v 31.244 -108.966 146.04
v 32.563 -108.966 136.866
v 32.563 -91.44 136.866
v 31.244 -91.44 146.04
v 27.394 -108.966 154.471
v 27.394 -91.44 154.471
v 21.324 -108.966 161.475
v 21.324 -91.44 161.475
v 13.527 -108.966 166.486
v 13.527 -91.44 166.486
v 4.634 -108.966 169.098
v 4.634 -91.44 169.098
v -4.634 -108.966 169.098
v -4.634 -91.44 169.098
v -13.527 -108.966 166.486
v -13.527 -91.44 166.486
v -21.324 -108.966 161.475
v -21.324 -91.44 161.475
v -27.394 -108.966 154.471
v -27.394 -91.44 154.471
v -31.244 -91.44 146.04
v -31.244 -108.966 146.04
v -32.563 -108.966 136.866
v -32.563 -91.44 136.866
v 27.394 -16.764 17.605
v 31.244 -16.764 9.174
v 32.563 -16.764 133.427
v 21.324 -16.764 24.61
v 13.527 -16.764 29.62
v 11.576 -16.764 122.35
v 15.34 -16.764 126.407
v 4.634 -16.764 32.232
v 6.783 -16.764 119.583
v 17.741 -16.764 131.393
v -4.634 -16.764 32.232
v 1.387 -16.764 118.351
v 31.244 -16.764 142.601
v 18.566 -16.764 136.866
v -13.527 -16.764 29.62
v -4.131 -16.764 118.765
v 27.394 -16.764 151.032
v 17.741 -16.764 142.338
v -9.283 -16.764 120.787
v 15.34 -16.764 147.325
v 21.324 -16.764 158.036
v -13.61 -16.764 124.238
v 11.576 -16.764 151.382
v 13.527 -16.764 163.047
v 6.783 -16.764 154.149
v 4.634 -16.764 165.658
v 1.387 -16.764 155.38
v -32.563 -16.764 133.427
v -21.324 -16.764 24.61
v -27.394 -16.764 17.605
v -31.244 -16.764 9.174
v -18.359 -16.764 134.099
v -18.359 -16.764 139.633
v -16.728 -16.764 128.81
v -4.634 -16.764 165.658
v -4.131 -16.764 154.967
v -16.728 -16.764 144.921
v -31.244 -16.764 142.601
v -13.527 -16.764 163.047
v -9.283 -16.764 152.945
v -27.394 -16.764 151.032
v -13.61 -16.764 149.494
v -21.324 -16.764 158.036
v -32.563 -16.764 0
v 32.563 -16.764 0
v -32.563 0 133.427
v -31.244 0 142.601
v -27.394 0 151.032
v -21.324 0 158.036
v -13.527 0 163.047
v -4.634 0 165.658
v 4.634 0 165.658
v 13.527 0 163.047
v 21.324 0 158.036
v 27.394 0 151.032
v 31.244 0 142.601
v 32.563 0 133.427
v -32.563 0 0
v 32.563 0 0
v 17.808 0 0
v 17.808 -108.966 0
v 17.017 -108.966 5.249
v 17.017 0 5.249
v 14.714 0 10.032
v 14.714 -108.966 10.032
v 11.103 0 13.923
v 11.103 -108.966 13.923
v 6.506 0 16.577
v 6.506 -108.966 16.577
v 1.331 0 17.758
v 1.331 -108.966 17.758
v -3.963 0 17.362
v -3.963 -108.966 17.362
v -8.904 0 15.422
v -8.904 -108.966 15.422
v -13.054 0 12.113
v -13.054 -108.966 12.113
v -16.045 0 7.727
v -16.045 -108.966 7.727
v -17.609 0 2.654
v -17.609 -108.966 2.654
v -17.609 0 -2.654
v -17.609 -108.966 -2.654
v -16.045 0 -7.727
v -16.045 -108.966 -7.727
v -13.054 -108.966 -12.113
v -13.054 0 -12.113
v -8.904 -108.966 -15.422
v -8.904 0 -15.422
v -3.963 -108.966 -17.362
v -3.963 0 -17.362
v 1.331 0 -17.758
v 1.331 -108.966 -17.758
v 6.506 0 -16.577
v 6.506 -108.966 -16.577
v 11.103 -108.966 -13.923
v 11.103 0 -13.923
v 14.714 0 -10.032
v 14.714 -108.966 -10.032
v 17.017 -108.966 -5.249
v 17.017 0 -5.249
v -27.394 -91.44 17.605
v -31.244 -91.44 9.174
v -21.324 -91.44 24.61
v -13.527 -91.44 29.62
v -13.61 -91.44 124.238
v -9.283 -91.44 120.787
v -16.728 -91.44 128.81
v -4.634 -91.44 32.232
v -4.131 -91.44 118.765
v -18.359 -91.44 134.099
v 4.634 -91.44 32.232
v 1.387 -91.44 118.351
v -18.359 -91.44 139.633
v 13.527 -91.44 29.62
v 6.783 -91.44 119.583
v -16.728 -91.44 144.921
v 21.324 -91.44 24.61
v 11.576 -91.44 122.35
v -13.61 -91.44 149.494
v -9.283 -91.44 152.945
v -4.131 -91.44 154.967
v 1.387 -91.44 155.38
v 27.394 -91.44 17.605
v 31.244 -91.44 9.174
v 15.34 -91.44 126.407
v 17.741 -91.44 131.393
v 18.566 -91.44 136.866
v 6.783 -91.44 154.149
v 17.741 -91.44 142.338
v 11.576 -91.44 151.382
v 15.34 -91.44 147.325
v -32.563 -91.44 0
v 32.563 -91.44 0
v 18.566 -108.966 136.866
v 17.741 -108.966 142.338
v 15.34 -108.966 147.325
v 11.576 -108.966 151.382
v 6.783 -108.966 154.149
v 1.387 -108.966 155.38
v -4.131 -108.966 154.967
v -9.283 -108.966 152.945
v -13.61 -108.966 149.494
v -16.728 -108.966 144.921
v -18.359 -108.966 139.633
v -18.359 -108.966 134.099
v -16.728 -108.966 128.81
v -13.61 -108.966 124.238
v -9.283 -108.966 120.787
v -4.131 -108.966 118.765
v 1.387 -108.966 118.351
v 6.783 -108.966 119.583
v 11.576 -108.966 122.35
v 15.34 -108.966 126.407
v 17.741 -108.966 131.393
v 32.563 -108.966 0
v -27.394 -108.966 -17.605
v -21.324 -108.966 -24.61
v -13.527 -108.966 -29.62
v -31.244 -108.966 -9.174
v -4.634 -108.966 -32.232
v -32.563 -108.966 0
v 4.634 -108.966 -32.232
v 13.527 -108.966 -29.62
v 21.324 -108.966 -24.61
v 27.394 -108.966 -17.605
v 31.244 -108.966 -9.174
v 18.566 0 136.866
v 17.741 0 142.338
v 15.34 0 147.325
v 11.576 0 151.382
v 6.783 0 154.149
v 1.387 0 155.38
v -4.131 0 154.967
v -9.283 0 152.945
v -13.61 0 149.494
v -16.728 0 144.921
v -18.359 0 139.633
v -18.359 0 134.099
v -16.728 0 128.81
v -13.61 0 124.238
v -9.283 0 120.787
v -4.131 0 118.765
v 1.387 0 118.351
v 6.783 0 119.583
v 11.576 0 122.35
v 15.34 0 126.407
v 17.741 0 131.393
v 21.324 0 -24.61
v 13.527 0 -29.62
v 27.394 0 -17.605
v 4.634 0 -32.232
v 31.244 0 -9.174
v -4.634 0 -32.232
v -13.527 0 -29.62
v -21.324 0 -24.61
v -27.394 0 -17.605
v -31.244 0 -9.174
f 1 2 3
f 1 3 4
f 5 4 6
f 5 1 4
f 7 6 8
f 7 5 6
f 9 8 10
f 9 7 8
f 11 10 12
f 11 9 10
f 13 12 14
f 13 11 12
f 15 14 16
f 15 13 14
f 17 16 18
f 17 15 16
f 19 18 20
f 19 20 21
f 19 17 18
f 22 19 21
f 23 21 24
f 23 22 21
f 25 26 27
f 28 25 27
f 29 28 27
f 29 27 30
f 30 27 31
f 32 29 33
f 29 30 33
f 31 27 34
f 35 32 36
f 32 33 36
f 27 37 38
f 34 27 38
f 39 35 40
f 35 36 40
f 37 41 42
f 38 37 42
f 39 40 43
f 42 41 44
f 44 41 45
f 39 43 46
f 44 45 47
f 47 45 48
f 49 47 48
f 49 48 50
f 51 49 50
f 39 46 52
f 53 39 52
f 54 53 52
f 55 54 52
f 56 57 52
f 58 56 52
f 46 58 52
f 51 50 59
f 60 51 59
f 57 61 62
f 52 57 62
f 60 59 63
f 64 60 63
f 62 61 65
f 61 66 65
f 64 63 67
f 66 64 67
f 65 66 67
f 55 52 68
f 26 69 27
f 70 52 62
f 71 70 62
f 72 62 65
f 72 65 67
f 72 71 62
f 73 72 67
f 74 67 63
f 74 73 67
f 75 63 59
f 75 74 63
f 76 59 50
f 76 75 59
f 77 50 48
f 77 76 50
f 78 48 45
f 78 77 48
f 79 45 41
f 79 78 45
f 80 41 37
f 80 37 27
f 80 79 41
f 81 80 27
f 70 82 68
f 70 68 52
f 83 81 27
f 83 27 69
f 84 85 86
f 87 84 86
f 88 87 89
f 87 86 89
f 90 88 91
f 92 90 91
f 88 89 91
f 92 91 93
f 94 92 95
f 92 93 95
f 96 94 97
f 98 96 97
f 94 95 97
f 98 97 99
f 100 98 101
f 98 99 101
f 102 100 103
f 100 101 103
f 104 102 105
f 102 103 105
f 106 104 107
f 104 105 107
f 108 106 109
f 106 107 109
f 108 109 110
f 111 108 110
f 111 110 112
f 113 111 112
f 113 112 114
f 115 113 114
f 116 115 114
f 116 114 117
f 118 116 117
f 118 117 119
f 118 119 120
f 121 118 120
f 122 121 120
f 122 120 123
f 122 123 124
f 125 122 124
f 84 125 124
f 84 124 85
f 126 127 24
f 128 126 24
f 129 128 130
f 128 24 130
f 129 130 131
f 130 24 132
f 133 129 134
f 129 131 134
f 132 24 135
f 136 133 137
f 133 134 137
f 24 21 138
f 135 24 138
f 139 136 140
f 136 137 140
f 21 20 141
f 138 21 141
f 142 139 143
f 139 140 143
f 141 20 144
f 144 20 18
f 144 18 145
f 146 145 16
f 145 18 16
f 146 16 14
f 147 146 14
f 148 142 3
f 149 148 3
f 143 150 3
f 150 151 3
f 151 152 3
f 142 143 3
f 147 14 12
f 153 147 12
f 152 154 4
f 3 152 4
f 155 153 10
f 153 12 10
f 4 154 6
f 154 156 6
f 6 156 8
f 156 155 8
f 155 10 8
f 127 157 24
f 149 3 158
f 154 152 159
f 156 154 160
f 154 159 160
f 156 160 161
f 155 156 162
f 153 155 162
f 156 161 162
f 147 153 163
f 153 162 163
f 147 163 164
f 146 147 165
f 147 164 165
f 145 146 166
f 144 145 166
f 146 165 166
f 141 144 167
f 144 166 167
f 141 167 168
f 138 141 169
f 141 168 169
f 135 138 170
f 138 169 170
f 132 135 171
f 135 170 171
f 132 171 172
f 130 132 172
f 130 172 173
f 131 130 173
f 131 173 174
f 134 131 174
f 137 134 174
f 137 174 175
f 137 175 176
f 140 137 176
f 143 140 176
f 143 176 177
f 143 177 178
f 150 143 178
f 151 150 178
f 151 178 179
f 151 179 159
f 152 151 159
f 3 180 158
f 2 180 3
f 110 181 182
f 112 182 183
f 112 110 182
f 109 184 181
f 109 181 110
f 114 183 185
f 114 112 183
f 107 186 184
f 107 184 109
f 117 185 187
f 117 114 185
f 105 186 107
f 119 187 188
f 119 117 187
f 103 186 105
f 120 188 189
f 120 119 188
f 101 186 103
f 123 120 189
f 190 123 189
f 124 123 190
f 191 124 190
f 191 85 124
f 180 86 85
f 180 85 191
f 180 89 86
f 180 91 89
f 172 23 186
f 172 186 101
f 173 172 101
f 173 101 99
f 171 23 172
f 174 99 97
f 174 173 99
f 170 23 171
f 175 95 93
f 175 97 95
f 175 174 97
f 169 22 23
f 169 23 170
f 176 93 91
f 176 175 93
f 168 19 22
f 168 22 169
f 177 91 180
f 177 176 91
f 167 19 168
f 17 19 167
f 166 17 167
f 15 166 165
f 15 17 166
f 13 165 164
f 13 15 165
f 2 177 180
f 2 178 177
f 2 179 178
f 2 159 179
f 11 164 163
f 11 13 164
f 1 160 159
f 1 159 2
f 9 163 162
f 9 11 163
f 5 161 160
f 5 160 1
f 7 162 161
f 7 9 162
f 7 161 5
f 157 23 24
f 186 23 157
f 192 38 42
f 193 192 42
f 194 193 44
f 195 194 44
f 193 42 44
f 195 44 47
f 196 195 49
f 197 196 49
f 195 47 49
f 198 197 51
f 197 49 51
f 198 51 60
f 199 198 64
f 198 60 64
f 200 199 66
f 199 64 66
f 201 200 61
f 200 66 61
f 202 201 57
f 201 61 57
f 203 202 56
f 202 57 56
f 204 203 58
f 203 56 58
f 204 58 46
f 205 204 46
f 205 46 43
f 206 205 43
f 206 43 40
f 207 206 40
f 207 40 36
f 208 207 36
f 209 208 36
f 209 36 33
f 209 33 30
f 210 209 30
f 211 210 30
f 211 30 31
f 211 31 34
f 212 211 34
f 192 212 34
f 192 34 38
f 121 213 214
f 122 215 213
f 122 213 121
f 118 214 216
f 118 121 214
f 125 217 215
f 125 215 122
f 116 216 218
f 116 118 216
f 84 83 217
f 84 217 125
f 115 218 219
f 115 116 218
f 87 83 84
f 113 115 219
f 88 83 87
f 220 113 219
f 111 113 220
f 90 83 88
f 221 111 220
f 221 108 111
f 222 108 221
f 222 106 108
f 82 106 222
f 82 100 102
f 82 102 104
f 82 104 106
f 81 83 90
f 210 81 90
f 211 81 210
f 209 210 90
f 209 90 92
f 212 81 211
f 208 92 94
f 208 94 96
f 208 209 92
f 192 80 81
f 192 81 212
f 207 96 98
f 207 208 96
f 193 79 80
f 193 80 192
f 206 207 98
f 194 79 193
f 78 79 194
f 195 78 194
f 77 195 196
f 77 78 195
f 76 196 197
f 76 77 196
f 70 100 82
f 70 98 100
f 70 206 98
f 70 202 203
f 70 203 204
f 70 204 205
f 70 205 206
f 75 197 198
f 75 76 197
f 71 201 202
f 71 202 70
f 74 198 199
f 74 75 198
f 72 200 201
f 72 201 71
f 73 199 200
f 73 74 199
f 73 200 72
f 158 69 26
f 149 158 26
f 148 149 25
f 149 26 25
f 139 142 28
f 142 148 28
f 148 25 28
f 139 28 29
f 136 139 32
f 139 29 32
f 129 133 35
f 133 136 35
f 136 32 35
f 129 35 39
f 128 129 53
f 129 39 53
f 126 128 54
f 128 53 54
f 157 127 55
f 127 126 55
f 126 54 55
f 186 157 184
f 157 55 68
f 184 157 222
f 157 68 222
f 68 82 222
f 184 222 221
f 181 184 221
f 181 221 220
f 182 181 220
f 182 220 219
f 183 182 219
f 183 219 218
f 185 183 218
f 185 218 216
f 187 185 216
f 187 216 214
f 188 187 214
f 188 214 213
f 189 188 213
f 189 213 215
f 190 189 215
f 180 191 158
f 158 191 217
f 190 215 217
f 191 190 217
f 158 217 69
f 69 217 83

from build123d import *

# Parameters (mm, degrees)
F0_R     = 32.56316
F1_DEPTH = 108.966
F3_DEPTH = 16.764
F5_DEPTH = 17.526
F6_R     = 18.566269
F7_DEPTH = 188.214
F6_R_2   = 17.808278
F8_DEPTH = 219.202


with BuildPart() as f1:
    # F0 (on Front) → F1 (new body)
    with BuildSketch(Plane.XZ):
        Circle(F0_R)
    extrude(amount=F1_DEPTH)

    # F2 (on face) → F3 (join)
    with BuildSketch(Plane(origin=(0, 0, 0), x_dir=(-1, 0, 0), z_dir=(0, 1, 0))):
        with BuildLine():
            ThreePointArc((-32.56316, 0), (0, 32.56316), (32.56316, 0))
            Line((32.56316, 0), (32.56316, 133.426726))
            ThreePointArc((32.56316, 133.426726), (0, 165.989885), (-32.56316, 133.426726))
            Line((-32.56316, 133.426726), (-32.56316, 0))
        make_face()
    extrude(amount=-F3_DEPTH)

    # F4 (on face) → F5 (join)
    with BuildSketch(Plane.XZ.offset(108.966)):
        with BuildLine():
            Line((-32.56316, 136.865824), (-32.56316, 0))
            ThreePointArc((-32.56316, 0), (0, 32.56316), (32.56316, 0))
            Line((32.56316, 0), (32.56316, 136.865824))
            ThreePointArc((32.56316, 136.865824), (0, 169.428984), (-32.56316, 136.865824))
        make_face()
    extrude(amount=-F5_DEPTH)

    # F6 (on face) → F7 (cut)
    with BuildSketch(Plane.XZ.offset(108.966)):
        with Locations((0, 136.865824)):
            Circle(F6_R)
    extrude(amount=-F7_DEPTH, mode=Mode.SUBTRACT)

    # F6 (on face) → F8 (cut)
    with BuildSketch(Plane.XZ.offset(108.966)):
        Circle(F6_R_2)
    extrude(amount=-F8_DEPTH, mode=Mode.SUBTRACT)


solid = f1.part
